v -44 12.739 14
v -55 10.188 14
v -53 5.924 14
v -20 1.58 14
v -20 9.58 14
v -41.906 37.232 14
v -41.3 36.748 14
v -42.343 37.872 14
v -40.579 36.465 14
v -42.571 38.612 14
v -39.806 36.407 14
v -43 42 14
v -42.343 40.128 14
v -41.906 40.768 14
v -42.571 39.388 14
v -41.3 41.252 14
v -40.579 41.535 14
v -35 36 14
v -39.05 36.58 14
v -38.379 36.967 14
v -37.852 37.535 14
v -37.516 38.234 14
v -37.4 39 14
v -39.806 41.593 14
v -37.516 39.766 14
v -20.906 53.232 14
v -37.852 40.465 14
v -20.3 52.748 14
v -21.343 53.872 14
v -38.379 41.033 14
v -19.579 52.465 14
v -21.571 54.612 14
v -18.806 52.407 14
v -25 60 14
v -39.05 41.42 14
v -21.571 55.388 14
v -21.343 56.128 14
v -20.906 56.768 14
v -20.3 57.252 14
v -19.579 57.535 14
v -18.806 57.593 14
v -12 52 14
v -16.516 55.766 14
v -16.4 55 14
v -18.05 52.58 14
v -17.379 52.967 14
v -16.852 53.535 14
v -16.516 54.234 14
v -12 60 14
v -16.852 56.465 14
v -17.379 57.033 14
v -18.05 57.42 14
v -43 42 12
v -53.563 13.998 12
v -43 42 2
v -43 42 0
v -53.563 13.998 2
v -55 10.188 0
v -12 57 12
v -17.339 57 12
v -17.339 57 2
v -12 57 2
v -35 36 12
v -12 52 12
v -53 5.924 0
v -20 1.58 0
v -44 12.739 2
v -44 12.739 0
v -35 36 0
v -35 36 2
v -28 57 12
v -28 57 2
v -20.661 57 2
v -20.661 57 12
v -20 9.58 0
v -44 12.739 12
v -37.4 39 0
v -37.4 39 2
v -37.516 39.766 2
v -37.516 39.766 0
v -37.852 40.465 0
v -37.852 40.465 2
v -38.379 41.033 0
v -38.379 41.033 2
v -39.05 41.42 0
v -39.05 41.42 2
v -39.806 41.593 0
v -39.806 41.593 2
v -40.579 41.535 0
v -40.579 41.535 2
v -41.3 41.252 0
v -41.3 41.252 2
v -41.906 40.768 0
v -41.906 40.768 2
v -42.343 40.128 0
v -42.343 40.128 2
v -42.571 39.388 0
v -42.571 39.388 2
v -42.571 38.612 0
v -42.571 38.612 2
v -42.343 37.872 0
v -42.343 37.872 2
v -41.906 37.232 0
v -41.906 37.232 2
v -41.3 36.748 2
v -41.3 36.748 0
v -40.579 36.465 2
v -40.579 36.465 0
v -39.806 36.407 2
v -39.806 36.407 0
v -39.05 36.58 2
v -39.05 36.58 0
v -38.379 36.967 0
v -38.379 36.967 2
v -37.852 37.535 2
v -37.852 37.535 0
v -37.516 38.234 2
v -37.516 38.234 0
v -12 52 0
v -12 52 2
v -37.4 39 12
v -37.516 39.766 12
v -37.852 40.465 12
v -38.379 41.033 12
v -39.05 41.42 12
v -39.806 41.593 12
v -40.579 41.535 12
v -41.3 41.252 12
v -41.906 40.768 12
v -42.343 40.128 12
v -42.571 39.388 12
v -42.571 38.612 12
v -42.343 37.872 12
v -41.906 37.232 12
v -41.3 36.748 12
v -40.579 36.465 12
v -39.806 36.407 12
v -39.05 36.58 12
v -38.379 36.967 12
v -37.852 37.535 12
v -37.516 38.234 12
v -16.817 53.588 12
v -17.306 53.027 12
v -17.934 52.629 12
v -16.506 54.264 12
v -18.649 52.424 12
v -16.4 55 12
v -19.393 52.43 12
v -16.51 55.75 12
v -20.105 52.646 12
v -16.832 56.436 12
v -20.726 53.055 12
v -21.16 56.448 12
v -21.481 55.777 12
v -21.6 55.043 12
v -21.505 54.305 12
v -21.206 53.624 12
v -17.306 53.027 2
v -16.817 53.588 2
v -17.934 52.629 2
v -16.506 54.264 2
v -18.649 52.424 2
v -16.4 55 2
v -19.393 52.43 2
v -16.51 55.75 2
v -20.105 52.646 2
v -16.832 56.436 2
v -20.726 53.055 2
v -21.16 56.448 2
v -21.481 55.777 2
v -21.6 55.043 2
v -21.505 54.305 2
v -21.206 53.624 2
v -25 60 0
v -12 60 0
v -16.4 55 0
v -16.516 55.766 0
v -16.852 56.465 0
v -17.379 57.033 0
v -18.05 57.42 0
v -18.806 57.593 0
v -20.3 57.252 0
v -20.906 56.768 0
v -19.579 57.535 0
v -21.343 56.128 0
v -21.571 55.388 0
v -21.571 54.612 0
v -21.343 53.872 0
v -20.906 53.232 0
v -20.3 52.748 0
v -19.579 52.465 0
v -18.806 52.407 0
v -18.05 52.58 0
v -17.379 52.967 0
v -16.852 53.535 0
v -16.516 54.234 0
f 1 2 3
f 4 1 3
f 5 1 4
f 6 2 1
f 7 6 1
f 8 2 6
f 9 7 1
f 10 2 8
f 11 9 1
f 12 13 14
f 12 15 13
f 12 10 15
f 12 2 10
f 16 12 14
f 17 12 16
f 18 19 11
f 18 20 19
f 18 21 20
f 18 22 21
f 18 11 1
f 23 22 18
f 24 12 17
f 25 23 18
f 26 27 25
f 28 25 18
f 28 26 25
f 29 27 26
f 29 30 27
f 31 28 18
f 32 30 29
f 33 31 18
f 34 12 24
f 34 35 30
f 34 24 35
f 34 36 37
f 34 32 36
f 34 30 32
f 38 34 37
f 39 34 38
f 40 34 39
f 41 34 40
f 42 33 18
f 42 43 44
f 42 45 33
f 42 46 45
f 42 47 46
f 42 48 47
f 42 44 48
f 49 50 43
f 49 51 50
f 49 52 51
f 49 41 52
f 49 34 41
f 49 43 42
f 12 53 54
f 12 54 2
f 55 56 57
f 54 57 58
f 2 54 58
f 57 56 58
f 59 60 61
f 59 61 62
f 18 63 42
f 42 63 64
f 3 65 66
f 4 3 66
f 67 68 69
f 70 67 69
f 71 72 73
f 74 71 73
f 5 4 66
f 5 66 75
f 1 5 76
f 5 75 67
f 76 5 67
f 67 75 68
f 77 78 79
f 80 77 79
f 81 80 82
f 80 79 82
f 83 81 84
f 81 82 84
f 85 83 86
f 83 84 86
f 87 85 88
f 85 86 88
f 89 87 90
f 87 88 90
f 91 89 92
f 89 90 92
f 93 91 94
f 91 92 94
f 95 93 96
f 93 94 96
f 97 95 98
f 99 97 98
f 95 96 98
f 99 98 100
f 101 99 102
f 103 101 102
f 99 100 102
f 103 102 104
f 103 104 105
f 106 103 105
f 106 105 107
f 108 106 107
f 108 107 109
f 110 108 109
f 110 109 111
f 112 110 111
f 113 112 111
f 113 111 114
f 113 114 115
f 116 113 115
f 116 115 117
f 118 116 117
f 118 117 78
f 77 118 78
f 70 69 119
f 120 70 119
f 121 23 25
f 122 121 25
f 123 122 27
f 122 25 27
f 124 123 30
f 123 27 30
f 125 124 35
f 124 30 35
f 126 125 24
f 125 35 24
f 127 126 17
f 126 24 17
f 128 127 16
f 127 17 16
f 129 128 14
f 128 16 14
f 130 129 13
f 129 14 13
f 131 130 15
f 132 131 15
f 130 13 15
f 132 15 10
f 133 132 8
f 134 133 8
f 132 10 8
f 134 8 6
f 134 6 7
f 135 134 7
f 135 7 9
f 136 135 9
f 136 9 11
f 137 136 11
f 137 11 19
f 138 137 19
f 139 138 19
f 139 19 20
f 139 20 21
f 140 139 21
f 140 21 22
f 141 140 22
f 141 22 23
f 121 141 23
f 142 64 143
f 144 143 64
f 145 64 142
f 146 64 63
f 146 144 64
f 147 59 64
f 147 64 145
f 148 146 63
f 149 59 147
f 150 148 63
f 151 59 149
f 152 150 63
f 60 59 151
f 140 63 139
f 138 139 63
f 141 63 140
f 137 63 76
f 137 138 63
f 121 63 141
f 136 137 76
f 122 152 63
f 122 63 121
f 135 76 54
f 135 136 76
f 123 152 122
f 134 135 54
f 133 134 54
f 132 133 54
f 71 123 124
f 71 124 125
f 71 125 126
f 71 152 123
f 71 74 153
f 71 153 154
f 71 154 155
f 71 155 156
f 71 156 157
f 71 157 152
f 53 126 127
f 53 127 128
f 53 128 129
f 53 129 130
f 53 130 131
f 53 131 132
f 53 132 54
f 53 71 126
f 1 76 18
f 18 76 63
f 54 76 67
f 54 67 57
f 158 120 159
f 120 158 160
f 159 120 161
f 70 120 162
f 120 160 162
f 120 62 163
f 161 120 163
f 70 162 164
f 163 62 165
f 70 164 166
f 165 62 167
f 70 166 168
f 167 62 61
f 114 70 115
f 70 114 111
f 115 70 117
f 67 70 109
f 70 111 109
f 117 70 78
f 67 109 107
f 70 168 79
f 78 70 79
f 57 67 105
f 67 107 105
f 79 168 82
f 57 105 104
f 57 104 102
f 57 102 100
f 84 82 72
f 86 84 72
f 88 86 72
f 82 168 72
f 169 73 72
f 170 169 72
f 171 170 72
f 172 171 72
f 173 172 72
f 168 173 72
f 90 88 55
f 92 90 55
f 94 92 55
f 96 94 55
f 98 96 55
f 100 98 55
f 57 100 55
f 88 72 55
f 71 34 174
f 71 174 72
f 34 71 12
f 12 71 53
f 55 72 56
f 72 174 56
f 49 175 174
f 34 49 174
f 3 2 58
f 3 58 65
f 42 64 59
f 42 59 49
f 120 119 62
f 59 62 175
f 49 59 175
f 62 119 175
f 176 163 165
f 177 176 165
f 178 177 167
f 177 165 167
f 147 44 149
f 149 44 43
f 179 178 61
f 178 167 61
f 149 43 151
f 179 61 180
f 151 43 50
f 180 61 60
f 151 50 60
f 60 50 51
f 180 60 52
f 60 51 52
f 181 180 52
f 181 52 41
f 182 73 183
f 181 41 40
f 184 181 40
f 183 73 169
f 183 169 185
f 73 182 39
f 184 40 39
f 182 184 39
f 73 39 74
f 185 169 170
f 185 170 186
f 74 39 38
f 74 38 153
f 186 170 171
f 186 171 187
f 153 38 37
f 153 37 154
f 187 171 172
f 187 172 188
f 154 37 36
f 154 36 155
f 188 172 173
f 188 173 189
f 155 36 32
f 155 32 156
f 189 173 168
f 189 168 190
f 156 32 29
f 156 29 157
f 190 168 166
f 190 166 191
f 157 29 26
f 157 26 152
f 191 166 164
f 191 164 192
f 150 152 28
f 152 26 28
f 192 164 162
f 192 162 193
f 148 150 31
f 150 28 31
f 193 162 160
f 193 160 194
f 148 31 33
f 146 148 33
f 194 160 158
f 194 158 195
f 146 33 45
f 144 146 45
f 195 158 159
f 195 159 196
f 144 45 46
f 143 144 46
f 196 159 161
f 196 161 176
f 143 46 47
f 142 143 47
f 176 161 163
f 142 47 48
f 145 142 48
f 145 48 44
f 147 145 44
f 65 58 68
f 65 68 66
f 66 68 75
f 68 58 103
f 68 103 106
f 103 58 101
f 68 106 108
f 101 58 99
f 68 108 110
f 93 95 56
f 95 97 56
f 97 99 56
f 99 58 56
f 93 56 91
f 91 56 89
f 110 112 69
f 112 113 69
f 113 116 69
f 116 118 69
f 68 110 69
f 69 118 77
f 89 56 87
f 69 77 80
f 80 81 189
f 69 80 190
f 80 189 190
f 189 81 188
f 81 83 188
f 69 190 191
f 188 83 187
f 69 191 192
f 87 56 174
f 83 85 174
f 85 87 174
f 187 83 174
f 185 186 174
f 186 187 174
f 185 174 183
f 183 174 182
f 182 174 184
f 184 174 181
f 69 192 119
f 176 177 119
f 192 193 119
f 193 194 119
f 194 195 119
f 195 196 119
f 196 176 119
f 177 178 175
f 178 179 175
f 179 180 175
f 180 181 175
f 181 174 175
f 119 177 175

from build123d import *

# Parameters (mm, degrees)
EXTRUDE_2_DEPTH                = 14
FORK_ABOVE_MOUNTING_FOOT_DEPTH = 5
SKETCH_4_R                     = 2.6
OUTER_PIVOT_BORE_DEPTH         = 83.58934556
SKETCH_5_R                     = 2.6
UPPER_HINGE_BORE_DEPTH         = 83.58934556


with BuildPart() as part:
    # 草图1 → Extrude 2 (new body)
    with BuildSketch(Plane.XY):
        Polygon((-12, 60), (-25, 60), (-43, 42), (-55, 10.187667387), (-53, 5.924362391), (-20, 1.579829971), (-20, 9.579829971), (-44, 12.739489913), (-35, 36), (-12, 52), align=None)
    extrude(amount=EXTRUDE_2_DEPTH)

    # 草图3 → Fork_above_mounting_foot (cut, symmetric)
    with BuildSketch(Plane.XY.offset(7)):
        Polygon((5, 6.288517531), (-65, 15.504192362), (-65, 57), (5, 57), align=None)
    extrude(amount=FORK_ABOVE_MOUNTING_FOOT_DEPTH, both=True, mode=Mode.SUBTRACT)

    # 草图4 → Outer_pivot_bore (cut, through all)
    with BuildSketch(Plane.XY.offset(14)):
        with Locations((-40, 39)):
            Circle(SKETCH_4_R)
    extrude(amount=-OUTER_PIVOT_BORE_DEPTH, mode=Mode.SUBTRACT)

    # 草图5 → Upper_hinge_bore (cut, through all)
    with BuildSketch(Plane.XY.offset(14)):
        with Locations((-19, 55)):
            Circle(SKETCH_5_R)
    extrude(amount=-UPPER_HINGE_BORE_DEPTH, mode=Mode.SUBTRACT)


solid = part.part
